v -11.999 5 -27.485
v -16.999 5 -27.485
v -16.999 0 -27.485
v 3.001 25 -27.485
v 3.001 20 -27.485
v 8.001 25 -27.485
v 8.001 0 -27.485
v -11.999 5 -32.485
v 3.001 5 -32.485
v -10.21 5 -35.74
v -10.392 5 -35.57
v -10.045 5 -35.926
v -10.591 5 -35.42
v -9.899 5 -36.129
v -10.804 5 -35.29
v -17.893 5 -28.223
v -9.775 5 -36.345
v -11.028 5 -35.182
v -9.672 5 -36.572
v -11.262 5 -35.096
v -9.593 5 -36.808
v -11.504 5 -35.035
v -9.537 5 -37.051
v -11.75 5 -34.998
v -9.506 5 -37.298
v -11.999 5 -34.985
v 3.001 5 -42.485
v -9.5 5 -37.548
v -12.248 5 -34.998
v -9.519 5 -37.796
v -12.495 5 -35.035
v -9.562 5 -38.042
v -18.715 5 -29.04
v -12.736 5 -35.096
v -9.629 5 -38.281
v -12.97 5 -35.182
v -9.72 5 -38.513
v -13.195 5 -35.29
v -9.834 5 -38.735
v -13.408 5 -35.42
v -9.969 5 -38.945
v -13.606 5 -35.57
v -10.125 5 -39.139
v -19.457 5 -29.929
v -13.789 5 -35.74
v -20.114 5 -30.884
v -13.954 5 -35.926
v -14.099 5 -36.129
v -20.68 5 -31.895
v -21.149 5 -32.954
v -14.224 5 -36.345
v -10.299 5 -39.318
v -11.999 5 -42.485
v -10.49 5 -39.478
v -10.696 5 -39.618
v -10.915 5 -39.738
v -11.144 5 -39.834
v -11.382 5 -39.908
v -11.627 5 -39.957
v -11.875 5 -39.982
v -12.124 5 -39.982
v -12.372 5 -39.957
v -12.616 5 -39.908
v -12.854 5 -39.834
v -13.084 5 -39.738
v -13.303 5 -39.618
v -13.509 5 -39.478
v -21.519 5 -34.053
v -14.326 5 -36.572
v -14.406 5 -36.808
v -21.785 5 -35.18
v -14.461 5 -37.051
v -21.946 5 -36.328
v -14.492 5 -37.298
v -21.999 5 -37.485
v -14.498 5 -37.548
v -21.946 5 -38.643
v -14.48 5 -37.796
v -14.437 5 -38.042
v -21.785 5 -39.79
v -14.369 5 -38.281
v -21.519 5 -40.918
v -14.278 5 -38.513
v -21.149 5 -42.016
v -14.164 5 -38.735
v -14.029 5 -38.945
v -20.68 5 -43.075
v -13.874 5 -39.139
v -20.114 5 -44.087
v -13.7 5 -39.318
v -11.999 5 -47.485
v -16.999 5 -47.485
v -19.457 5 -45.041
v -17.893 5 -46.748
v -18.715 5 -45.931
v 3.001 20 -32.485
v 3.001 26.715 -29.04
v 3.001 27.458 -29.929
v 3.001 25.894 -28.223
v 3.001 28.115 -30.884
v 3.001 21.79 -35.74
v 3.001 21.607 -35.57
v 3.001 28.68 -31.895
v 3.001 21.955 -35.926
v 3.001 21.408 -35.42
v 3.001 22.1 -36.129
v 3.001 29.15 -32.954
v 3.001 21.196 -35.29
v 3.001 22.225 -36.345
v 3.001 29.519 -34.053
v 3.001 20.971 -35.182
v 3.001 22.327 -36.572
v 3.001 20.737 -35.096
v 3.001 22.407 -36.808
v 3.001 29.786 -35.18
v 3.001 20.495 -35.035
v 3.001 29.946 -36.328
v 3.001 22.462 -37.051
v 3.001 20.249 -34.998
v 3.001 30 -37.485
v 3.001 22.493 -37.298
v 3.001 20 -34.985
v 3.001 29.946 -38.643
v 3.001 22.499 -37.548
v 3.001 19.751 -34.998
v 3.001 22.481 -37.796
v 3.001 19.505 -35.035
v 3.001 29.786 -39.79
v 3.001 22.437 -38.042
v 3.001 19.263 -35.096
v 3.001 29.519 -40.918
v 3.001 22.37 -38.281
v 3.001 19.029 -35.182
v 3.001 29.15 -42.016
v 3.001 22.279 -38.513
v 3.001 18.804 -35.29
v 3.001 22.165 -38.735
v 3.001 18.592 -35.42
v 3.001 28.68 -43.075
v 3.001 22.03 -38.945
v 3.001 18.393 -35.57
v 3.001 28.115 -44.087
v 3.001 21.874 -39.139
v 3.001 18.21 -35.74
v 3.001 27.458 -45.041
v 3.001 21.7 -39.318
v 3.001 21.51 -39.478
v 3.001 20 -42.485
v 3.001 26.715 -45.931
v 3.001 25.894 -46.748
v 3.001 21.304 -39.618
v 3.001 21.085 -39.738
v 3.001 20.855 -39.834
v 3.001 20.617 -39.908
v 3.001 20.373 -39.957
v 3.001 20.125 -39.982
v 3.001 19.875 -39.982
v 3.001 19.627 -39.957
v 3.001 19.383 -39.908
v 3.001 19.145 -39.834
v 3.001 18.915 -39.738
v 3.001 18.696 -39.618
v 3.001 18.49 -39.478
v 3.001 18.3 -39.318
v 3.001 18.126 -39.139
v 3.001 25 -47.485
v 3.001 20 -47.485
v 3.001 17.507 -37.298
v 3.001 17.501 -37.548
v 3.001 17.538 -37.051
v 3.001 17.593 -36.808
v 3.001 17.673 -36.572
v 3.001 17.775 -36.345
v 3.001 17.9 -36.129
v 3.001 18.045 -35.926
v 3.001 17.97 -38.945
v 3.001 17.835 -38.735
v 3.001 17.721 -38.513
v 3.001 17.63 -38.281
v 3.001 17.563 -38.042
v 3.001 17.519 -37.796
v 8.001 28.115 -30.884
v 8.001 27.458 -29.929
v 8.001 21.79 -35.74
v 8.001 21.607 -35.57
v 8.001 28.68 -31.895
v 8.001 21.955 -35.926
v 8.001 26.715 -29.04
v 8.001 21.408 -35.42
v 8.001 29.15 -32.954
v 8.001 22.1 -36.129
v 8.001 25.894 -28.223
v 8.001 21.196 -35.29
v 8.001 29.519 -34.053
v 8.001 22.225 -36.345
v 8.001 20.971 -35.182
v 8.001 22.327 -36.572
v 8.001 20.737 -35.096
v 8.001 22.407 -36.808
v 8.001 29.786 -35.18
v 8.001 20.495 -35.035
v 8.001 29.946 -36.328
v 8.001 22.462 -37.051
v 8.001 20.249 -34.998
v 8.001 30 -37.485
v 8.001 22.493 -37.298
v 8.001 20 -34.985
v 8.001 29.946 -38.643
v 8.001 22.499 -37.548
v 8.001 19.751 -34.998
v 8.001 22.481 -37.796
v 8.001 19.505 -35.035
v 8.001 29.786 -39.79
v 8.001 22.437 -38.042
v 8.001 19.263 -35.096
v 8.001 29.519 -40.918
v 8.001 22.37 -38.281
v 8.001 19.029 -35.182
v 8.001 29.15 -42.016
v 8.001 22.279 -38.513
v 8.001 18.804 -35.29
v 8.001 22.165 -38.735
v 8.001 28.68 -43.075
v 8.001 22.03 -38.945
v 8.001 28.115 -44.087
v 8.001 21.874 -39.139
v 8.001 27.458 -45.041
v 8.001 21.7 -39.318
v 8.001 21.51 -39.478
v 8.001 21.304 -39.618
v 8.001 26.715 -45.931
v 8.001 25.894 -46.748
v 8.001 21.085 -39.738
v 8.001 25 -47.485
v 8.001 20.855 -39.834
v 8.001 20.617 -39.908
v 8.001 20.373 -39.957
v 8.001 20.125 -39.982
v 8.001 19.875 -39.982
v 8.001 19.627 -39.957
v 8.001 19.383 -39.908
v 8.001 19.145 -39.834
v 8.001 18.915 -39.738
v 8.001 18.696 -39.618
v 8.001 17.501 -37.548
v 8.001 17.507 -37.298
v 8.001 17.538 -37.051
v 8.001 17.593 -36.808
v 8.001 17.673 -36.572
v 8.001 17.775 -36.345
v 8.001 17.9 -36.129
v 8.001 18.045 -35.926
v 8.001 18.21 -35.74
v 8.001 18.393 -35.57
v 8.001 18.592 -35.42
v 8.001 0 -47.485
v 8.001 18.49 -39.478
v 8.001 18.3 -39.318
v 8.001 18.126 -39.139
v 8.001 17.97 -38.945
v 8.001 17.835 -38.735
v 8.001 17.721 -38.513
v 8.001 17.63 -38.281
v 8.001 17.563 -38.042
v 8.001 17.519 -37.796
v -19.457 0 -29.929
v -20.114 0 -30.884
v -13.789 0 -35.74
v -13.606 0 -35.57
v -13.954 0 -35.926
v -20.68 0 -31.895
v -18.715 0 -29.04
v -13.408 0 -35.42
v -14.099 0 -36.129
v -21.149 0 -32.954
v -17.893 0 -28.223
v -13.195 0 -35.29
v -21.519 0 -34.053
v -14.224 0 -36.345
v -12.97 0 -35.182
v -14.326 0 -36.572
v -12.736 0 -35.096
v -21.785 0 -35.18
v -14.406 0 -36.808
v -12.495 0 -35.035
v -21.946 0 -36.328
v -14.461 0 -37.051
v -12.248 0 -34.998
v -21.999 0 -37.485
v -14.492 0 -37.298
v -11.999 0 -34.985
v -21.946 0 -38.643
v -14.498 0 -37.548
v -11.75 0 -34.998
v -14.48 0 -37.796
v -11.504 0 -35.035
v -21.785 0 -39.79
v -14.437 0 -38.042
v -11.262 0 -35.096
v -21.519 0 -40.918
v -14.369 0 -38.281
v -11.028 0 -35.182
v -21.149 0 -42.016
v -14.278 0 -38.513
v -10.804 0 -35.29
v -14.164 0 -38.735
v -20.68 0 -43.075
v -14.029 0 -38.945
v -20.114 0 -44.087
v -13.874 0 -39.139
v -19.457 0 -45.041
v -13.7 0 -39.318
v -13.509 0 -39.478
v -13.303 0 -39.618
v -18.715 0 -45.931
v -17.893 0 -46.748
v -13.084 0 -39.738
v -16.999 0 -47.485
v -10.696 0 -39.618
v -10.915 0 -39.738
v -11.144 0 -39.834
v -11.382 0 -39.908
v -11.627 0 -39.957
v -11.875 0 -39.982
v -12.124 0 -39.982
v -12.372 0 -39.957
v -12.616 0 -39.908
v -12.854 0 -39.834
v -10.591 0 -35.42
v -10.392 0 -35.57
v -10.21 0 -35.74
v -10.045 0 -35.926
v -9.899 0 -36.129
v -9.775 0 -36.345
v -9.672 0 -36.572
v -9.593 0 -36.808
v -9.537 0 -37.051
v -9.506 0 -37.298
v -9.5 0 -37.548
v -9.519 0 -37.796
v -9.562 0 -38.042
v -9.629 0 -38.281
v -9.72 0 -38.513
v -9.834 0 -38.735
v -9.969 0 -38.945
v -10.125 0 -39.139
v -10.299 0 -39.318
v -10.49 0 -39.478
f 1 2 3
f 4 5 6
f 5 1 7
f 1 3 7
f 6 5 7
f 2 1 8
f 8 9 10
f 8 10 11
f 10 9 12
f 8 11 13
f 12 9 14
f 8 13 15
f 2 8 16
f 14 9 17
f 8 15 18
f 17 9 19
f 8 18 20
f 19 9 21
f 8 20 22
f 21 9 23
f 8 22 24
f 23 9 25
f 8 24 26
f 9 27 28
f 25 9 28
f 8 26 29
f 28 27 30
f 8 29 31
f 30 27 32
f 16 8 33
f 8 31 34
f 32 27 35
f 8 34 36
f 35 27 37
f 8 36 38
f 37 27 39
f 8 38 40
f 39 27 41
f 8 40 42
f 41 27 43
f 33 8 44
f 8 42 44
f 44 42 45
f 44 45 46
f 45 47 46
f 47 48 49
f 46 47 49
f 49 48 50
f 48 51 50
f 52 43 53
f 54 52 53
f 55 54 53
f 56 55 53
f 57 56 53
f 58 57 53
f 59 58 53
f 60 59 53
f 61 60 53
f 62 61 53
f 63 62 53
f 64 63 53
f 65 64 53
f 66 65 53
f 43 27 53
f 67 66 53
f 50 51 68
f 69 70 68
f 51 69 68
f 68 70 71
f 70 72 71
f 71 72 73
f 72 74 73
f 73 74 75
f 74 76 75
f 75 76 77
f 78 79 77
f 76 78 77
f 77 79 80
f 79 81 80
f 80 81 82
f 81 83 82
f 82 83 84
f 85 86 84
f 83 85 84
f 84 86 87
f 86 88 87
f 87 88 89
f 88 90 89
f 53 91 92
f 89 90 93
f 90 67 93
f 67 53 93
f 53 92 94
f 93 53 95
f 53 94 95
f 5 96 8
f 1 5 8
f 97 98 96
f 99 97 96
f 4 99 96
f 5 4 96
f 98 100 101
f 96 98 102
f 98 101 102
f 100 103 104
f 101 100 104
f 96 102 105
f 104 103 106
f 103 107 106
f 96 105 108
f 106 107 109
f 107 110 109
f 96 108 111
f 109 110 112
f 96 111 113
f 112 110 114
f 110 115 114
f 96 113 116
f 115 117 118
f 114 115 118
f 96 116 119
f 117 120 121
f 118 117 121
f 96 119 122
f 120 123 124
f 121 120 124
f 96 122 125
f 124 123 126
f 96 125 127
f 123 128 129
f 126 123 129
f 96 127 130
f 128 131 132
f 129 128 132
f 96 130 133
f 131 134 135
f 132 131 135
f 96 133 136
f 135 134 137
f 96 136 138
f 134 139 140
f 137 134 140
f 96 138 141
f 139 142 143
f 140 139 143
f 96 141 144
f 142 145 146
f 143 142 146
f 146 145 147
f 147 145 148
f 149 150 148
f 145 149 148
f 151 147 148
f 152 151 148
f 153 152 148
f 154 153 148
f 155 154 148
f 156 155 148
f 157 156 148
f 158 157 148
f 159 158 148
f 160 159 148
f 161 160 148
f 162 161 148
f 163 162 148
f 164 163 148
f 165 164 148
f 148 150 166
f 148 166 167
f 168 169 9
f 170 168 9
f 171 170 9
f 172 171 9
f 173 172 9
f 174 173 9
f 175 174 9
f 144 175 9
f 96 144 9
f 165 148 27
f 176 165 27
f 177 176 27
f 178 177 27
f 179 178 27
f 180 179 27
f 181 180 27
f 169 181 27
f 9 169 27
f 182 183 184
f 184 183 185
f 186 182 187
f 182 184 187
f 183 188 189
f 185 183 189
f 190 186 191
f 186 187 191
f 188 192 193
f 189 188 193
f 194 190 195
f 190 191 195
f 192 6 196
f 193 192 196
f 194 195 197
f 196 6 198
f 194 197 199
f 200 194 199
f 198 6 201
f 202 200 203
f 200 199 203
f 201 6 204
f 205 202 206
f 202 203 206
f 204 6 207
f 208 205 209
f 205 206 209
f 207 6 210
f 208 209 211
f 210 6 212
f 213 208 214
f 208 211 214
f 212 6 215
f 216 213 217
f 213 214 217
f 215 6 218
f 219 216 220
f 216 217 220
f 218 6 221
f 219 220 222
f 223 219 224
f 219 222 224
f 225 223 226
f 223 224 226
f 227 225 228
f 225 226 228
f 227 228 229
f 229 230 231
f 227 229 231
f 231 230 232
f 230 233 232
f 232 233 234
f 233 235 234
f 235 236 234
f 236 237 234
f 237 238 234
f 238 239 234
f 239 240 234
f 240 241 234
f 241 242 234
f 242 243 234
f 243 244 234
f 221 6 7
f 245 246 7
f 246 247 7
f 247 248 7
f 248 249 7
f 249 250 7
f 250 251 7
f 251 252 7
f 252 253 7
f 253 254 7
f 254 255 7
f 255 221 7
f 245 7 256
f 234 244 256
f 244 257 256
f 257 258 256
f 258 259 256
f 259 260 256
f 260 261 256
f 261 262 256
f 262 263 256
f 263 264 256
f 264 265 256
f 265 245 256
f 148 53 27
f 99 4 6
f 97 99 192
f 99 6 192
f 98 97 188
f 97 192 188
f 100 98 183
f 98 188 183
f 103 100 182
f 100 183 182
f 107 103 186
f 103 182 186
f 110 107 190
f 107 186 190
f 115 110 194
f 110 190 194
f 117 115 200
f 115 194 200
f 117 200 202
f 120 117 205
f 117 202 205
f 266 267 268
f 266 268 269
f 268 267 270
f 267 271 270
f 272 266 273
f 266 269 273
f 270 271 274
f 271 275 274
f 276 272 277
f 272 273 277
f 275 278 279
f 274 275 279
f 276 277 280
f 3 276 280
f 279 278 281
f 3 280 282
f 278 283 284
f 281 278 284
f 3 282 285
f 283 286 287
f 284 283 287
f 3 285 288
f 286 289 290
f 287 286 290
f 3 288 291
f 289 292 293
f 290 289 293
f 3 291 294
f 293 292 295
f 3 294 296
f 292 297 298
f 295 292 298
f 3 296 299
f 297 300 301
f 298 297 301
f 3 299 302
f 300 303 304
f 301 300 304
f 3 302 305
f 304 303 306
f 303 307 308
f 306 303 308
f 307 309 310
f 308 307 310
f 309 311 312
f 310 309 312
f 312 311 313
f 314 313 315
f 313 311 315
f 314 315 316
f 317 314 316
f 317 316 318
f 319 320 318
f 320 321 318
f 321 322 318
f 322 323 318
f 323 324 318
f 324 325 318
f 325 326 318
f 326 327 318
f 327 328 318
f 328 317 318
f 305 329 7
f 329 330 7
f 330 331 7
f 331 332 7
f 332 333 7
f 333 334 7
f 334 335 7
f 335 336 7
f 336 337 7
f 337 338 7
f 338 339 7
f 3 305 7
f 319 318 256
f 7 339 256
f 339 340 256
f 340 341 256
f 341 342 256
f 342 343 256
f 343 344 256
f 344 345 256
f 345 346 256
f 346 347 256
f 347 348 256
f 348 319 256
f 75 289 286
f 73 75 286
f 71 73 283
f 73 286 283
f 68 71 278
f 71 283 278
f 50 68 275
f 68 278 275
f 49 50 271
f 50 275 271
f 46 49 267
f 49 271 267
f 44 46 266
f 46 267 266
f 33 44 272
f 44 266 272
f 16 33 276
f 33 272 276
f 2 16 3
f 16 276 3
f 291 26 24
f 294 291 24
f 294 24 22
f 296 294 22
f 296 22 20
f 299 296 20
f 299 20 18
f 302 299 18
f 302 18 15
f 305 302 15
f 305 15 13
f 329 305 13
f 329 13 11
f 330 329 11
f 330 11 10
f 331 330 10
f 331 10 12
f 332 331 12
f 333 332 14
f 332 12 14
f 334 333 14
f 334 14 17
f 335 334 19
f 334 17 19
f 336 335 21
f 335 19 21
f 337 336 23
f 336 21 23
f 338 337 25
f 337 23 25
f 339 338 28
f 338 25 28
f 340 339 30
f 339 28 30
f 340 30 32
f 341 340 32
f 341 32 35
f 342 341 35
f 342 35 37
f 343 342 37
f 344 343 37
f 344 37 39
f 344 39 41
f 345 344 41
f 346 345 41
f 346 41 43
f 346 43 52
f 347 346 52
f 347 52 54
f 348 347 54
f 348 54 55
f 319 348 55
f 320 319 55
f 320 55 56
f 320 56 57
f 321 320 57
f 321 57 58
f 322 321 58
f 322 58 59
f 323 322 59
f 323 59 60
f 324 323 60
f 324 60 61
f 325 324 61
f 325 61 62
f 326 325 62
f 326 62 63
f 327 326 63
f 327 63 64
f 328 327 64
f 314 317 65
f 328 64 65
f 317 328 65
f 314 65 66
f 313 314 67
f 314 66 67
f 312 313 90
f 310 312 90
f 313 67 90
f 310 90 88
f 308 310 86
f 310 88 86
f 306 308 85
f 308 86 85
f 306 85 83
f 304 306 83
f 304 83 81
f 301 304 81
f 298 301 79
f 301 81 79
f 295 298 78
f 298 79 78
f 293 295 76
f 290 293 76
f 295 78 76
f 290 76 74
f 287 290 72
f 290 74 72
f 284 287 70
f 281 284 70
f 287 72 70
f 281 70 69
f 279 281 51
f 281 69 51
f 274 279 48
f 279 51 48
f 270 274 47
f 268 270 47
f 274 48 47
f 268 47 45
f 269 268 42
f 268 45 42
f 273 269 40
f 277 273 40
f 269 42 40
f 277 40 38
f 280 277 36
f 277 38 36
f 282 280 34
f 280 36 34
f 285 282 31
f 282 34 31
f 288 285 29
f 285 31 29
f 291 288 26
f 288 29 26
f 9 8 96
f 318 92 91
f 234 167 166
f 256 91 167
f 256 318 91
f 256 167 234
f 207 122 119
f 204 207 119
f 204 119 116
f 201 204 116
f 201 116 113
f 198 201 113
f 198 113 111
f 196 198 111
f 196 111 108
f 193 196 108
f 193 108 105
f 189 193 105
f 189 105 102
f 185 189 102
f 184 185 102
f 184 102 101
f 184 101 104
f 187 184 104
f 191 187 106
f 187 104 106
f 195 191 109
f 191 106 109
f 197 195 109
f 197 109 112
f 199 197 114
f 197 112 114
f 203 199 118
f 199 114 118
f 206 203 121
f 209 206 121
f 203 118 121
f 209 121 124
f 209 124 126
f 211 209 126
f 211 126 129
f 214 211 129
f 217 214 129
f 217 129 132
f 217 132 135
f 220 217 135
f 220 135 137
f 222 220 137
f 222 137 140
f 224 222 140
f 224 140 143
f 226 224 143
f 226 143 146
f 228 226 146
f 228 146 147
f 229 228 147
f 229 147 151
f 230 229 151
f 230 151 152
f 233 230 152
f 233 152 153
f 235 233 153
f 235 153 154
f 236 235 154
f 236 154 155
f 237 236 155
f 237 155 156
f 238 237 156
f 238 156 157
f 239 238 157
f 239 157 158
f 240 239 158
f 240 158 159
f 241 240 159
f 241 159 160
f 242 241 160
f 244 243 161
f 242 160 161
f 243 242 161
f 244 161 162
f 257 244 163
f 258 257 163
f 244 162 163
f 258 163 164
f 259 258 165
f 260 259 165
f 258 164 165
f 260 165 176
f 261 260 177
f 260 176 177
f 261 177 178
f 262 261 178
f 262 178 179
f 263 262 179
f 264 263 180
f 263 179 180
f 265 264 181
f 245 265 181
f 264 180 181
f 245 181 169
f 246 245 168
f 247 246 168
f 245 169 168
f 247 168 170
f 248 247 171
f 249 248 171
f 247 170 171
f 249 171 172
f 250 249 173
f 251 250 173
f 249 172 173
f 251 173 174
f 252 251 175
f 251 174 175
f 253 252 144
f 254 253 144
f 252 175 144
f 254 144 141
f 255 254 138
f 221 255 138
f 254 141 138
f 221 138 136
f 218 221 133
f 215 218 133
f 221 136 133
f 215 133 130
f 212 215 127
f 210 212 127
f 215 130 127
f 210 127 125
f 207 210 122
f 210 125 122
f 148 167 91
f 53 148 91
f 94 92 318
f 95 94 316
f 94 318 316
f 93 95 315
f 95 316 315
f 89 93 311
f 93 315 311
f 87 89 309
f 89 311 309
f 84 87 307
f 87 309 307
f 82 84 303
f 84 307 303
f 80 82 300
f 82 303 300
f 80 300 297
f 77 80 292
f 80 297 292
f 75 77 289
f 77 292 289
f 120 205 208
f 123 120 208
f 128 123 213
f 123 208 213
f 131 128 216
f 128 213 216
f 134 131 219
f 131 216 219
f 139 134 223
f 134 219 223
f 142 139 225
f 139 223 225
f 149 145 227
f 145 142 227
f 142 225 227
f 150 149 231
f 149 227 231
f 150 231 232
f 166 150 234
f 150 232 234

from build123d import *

# Parameters (mm, degrees)
SKETCH2_W           = 30
SKETCH2_H           = 20
BOSS_EXTRUDE1_DEPTH = 30
SKETCH3_W           = 25
SKETCH3_H           = 10
CUT_EXTRUDE1_DEPTH  = 25
CUT_EXTRUDE3_DEPTH  = 25
CUT_EXTRUDE4_DEPTH  = 25
CUT_EXTRUDE5_DEPTH  = 25
SKETCH7_R           = 2.5
CUT_EXTRUDE6_DEPTH  = 25
SKETCH8_R           = 2.5
CUT_EXTRUDE7_DEPTH  = 25


with BuildPart() as part:
    # Sketch2 → Boss-Extrude1 (new body)
    with BuildSketch(Plane(origin=(0, 0, 0), x_dir=(1, 0, 0), z_dir=(0, 1, 0))):
        with Locations((-6.999241769, 37.48522127)):
            Rectangle(SKETCH2_W, SKETCH2_H)
    extrude(amount=BOSS_EXTRUDE1_DEPTH)

    # Sketch3 → Cut-Extrude1 (cut)
    with BuildSketch(Plane(origin=(0, 30, 0), x_dir=(1, 0, 0), z_dir=(0, 1, 0))):
        with Locations((-9.499241769, 37.48522127)):
            Rectangle(SKETCH3_W, SKETCH3_H)
    extrude(amount=-CUT_EXTRUDE1_DEPTH, mode=Mode.SUBTRACT)

    # Sketch4 → Cut-Extrude3 (cut)
    with BuildSketch(Plane(origin=(0, 0, -47.48522127), x_dir=(-1, 0, 0), z_dir=(0, 0, -1))):
        Polygon((21.999241769, 30), (-3.000758231, 30), (-3.000758231, 20), (11.999241769, 5), (21.999241769, 5), align=None)
    extrude(amount=-CUT_EXTRUDE3_DEPTH, mode=Mode.SUBTRACT)

    # Sketch5 → Cut-Extrude4 (cut)
    with BuildSketch(Plane(origin=(8.000758231, 0, 0), x_dir=(0, 0, -1), z_dir=(1, 0, 0))):
        with BuildLine():
            Line((37.48522127, 30), (27.48522127, 30))
            Line((27.48522127, 30), (27.48522127, 25))
            ThreePointArc((27.48522127, 25), (31.895051326, 28.680339887), (37.48522127, 30))
        make_face()
        with BuildLine():
            Line((47.48522127, 30), (37.48522127, 30))
            ThreePointArc((37.48522127, 30), (43.075391214, 28.680339887), (47.48522127, 25))
            Line((47.48522127, 25), (47.48522127, 30))
        make_face()
    extrude(amount=-CUT_EXTRUDE4_DEPTH, mode=Mode.SUBTRACT)

    # Sketch6 → Cut-Extrude5 (cut)
    with BuildSketch(Plane.XZ):
        with BuildLine():
            Line((-16.999241769, -27.48522127), (-21.999241769, -27.48522127))
            Line((-21.999241769, -27.48522127), (-21.999241769, -37.485221231))
            ThreePointArc((-21.999241769, -37.485221231), (-20.679581647, -31.895051309), (-16.999241769, -27.48522127))
        make_face()
        with BuildLine():
            ThreePointArc((-16.999241769, -47.48522127), (-20.679581665, -43.075391196), (-21.999241769, -37.485221231))
            Line((-21.999241769, -37.485221231), (-21.999241769, -47.48522127))
            Line((-21.999241769, -47.48522127), (-16.999241769, -47.48522127))
        make_face()
    extrude(amount=-CUT_EXTRUDE5_DEPTH, mode=Mode.SUBTRACT)

    # Sketch7 → Cut-Extrude6 (cut)
    with BuildSketch(Plane(origin=(0, 5, 0), x_dir=(1, 0, 0), z_dir=(0, 1, 0))):
        with Locations(Location((-11.999241769, 37.48522127, 0), (0, 0, 270))):
            Circle(SKETCH7_R)
    extrude(amount=-CUT_EXTRUDE6_DEPTH, mode=Mode.SUBTRACT)

    # Sketch8 → Cut-Extrude7 (cut)
    with BuildSketch(Plane.ZY.offset(-3.000758231)):
        with Locations((-37.48522127, 20)):
            Circle(SKETCH8_R)
    extrude(amount=-CUT_EXTRUDE7_DEPTH, mode=Mode.SUBTRACT)


solid = part.part
